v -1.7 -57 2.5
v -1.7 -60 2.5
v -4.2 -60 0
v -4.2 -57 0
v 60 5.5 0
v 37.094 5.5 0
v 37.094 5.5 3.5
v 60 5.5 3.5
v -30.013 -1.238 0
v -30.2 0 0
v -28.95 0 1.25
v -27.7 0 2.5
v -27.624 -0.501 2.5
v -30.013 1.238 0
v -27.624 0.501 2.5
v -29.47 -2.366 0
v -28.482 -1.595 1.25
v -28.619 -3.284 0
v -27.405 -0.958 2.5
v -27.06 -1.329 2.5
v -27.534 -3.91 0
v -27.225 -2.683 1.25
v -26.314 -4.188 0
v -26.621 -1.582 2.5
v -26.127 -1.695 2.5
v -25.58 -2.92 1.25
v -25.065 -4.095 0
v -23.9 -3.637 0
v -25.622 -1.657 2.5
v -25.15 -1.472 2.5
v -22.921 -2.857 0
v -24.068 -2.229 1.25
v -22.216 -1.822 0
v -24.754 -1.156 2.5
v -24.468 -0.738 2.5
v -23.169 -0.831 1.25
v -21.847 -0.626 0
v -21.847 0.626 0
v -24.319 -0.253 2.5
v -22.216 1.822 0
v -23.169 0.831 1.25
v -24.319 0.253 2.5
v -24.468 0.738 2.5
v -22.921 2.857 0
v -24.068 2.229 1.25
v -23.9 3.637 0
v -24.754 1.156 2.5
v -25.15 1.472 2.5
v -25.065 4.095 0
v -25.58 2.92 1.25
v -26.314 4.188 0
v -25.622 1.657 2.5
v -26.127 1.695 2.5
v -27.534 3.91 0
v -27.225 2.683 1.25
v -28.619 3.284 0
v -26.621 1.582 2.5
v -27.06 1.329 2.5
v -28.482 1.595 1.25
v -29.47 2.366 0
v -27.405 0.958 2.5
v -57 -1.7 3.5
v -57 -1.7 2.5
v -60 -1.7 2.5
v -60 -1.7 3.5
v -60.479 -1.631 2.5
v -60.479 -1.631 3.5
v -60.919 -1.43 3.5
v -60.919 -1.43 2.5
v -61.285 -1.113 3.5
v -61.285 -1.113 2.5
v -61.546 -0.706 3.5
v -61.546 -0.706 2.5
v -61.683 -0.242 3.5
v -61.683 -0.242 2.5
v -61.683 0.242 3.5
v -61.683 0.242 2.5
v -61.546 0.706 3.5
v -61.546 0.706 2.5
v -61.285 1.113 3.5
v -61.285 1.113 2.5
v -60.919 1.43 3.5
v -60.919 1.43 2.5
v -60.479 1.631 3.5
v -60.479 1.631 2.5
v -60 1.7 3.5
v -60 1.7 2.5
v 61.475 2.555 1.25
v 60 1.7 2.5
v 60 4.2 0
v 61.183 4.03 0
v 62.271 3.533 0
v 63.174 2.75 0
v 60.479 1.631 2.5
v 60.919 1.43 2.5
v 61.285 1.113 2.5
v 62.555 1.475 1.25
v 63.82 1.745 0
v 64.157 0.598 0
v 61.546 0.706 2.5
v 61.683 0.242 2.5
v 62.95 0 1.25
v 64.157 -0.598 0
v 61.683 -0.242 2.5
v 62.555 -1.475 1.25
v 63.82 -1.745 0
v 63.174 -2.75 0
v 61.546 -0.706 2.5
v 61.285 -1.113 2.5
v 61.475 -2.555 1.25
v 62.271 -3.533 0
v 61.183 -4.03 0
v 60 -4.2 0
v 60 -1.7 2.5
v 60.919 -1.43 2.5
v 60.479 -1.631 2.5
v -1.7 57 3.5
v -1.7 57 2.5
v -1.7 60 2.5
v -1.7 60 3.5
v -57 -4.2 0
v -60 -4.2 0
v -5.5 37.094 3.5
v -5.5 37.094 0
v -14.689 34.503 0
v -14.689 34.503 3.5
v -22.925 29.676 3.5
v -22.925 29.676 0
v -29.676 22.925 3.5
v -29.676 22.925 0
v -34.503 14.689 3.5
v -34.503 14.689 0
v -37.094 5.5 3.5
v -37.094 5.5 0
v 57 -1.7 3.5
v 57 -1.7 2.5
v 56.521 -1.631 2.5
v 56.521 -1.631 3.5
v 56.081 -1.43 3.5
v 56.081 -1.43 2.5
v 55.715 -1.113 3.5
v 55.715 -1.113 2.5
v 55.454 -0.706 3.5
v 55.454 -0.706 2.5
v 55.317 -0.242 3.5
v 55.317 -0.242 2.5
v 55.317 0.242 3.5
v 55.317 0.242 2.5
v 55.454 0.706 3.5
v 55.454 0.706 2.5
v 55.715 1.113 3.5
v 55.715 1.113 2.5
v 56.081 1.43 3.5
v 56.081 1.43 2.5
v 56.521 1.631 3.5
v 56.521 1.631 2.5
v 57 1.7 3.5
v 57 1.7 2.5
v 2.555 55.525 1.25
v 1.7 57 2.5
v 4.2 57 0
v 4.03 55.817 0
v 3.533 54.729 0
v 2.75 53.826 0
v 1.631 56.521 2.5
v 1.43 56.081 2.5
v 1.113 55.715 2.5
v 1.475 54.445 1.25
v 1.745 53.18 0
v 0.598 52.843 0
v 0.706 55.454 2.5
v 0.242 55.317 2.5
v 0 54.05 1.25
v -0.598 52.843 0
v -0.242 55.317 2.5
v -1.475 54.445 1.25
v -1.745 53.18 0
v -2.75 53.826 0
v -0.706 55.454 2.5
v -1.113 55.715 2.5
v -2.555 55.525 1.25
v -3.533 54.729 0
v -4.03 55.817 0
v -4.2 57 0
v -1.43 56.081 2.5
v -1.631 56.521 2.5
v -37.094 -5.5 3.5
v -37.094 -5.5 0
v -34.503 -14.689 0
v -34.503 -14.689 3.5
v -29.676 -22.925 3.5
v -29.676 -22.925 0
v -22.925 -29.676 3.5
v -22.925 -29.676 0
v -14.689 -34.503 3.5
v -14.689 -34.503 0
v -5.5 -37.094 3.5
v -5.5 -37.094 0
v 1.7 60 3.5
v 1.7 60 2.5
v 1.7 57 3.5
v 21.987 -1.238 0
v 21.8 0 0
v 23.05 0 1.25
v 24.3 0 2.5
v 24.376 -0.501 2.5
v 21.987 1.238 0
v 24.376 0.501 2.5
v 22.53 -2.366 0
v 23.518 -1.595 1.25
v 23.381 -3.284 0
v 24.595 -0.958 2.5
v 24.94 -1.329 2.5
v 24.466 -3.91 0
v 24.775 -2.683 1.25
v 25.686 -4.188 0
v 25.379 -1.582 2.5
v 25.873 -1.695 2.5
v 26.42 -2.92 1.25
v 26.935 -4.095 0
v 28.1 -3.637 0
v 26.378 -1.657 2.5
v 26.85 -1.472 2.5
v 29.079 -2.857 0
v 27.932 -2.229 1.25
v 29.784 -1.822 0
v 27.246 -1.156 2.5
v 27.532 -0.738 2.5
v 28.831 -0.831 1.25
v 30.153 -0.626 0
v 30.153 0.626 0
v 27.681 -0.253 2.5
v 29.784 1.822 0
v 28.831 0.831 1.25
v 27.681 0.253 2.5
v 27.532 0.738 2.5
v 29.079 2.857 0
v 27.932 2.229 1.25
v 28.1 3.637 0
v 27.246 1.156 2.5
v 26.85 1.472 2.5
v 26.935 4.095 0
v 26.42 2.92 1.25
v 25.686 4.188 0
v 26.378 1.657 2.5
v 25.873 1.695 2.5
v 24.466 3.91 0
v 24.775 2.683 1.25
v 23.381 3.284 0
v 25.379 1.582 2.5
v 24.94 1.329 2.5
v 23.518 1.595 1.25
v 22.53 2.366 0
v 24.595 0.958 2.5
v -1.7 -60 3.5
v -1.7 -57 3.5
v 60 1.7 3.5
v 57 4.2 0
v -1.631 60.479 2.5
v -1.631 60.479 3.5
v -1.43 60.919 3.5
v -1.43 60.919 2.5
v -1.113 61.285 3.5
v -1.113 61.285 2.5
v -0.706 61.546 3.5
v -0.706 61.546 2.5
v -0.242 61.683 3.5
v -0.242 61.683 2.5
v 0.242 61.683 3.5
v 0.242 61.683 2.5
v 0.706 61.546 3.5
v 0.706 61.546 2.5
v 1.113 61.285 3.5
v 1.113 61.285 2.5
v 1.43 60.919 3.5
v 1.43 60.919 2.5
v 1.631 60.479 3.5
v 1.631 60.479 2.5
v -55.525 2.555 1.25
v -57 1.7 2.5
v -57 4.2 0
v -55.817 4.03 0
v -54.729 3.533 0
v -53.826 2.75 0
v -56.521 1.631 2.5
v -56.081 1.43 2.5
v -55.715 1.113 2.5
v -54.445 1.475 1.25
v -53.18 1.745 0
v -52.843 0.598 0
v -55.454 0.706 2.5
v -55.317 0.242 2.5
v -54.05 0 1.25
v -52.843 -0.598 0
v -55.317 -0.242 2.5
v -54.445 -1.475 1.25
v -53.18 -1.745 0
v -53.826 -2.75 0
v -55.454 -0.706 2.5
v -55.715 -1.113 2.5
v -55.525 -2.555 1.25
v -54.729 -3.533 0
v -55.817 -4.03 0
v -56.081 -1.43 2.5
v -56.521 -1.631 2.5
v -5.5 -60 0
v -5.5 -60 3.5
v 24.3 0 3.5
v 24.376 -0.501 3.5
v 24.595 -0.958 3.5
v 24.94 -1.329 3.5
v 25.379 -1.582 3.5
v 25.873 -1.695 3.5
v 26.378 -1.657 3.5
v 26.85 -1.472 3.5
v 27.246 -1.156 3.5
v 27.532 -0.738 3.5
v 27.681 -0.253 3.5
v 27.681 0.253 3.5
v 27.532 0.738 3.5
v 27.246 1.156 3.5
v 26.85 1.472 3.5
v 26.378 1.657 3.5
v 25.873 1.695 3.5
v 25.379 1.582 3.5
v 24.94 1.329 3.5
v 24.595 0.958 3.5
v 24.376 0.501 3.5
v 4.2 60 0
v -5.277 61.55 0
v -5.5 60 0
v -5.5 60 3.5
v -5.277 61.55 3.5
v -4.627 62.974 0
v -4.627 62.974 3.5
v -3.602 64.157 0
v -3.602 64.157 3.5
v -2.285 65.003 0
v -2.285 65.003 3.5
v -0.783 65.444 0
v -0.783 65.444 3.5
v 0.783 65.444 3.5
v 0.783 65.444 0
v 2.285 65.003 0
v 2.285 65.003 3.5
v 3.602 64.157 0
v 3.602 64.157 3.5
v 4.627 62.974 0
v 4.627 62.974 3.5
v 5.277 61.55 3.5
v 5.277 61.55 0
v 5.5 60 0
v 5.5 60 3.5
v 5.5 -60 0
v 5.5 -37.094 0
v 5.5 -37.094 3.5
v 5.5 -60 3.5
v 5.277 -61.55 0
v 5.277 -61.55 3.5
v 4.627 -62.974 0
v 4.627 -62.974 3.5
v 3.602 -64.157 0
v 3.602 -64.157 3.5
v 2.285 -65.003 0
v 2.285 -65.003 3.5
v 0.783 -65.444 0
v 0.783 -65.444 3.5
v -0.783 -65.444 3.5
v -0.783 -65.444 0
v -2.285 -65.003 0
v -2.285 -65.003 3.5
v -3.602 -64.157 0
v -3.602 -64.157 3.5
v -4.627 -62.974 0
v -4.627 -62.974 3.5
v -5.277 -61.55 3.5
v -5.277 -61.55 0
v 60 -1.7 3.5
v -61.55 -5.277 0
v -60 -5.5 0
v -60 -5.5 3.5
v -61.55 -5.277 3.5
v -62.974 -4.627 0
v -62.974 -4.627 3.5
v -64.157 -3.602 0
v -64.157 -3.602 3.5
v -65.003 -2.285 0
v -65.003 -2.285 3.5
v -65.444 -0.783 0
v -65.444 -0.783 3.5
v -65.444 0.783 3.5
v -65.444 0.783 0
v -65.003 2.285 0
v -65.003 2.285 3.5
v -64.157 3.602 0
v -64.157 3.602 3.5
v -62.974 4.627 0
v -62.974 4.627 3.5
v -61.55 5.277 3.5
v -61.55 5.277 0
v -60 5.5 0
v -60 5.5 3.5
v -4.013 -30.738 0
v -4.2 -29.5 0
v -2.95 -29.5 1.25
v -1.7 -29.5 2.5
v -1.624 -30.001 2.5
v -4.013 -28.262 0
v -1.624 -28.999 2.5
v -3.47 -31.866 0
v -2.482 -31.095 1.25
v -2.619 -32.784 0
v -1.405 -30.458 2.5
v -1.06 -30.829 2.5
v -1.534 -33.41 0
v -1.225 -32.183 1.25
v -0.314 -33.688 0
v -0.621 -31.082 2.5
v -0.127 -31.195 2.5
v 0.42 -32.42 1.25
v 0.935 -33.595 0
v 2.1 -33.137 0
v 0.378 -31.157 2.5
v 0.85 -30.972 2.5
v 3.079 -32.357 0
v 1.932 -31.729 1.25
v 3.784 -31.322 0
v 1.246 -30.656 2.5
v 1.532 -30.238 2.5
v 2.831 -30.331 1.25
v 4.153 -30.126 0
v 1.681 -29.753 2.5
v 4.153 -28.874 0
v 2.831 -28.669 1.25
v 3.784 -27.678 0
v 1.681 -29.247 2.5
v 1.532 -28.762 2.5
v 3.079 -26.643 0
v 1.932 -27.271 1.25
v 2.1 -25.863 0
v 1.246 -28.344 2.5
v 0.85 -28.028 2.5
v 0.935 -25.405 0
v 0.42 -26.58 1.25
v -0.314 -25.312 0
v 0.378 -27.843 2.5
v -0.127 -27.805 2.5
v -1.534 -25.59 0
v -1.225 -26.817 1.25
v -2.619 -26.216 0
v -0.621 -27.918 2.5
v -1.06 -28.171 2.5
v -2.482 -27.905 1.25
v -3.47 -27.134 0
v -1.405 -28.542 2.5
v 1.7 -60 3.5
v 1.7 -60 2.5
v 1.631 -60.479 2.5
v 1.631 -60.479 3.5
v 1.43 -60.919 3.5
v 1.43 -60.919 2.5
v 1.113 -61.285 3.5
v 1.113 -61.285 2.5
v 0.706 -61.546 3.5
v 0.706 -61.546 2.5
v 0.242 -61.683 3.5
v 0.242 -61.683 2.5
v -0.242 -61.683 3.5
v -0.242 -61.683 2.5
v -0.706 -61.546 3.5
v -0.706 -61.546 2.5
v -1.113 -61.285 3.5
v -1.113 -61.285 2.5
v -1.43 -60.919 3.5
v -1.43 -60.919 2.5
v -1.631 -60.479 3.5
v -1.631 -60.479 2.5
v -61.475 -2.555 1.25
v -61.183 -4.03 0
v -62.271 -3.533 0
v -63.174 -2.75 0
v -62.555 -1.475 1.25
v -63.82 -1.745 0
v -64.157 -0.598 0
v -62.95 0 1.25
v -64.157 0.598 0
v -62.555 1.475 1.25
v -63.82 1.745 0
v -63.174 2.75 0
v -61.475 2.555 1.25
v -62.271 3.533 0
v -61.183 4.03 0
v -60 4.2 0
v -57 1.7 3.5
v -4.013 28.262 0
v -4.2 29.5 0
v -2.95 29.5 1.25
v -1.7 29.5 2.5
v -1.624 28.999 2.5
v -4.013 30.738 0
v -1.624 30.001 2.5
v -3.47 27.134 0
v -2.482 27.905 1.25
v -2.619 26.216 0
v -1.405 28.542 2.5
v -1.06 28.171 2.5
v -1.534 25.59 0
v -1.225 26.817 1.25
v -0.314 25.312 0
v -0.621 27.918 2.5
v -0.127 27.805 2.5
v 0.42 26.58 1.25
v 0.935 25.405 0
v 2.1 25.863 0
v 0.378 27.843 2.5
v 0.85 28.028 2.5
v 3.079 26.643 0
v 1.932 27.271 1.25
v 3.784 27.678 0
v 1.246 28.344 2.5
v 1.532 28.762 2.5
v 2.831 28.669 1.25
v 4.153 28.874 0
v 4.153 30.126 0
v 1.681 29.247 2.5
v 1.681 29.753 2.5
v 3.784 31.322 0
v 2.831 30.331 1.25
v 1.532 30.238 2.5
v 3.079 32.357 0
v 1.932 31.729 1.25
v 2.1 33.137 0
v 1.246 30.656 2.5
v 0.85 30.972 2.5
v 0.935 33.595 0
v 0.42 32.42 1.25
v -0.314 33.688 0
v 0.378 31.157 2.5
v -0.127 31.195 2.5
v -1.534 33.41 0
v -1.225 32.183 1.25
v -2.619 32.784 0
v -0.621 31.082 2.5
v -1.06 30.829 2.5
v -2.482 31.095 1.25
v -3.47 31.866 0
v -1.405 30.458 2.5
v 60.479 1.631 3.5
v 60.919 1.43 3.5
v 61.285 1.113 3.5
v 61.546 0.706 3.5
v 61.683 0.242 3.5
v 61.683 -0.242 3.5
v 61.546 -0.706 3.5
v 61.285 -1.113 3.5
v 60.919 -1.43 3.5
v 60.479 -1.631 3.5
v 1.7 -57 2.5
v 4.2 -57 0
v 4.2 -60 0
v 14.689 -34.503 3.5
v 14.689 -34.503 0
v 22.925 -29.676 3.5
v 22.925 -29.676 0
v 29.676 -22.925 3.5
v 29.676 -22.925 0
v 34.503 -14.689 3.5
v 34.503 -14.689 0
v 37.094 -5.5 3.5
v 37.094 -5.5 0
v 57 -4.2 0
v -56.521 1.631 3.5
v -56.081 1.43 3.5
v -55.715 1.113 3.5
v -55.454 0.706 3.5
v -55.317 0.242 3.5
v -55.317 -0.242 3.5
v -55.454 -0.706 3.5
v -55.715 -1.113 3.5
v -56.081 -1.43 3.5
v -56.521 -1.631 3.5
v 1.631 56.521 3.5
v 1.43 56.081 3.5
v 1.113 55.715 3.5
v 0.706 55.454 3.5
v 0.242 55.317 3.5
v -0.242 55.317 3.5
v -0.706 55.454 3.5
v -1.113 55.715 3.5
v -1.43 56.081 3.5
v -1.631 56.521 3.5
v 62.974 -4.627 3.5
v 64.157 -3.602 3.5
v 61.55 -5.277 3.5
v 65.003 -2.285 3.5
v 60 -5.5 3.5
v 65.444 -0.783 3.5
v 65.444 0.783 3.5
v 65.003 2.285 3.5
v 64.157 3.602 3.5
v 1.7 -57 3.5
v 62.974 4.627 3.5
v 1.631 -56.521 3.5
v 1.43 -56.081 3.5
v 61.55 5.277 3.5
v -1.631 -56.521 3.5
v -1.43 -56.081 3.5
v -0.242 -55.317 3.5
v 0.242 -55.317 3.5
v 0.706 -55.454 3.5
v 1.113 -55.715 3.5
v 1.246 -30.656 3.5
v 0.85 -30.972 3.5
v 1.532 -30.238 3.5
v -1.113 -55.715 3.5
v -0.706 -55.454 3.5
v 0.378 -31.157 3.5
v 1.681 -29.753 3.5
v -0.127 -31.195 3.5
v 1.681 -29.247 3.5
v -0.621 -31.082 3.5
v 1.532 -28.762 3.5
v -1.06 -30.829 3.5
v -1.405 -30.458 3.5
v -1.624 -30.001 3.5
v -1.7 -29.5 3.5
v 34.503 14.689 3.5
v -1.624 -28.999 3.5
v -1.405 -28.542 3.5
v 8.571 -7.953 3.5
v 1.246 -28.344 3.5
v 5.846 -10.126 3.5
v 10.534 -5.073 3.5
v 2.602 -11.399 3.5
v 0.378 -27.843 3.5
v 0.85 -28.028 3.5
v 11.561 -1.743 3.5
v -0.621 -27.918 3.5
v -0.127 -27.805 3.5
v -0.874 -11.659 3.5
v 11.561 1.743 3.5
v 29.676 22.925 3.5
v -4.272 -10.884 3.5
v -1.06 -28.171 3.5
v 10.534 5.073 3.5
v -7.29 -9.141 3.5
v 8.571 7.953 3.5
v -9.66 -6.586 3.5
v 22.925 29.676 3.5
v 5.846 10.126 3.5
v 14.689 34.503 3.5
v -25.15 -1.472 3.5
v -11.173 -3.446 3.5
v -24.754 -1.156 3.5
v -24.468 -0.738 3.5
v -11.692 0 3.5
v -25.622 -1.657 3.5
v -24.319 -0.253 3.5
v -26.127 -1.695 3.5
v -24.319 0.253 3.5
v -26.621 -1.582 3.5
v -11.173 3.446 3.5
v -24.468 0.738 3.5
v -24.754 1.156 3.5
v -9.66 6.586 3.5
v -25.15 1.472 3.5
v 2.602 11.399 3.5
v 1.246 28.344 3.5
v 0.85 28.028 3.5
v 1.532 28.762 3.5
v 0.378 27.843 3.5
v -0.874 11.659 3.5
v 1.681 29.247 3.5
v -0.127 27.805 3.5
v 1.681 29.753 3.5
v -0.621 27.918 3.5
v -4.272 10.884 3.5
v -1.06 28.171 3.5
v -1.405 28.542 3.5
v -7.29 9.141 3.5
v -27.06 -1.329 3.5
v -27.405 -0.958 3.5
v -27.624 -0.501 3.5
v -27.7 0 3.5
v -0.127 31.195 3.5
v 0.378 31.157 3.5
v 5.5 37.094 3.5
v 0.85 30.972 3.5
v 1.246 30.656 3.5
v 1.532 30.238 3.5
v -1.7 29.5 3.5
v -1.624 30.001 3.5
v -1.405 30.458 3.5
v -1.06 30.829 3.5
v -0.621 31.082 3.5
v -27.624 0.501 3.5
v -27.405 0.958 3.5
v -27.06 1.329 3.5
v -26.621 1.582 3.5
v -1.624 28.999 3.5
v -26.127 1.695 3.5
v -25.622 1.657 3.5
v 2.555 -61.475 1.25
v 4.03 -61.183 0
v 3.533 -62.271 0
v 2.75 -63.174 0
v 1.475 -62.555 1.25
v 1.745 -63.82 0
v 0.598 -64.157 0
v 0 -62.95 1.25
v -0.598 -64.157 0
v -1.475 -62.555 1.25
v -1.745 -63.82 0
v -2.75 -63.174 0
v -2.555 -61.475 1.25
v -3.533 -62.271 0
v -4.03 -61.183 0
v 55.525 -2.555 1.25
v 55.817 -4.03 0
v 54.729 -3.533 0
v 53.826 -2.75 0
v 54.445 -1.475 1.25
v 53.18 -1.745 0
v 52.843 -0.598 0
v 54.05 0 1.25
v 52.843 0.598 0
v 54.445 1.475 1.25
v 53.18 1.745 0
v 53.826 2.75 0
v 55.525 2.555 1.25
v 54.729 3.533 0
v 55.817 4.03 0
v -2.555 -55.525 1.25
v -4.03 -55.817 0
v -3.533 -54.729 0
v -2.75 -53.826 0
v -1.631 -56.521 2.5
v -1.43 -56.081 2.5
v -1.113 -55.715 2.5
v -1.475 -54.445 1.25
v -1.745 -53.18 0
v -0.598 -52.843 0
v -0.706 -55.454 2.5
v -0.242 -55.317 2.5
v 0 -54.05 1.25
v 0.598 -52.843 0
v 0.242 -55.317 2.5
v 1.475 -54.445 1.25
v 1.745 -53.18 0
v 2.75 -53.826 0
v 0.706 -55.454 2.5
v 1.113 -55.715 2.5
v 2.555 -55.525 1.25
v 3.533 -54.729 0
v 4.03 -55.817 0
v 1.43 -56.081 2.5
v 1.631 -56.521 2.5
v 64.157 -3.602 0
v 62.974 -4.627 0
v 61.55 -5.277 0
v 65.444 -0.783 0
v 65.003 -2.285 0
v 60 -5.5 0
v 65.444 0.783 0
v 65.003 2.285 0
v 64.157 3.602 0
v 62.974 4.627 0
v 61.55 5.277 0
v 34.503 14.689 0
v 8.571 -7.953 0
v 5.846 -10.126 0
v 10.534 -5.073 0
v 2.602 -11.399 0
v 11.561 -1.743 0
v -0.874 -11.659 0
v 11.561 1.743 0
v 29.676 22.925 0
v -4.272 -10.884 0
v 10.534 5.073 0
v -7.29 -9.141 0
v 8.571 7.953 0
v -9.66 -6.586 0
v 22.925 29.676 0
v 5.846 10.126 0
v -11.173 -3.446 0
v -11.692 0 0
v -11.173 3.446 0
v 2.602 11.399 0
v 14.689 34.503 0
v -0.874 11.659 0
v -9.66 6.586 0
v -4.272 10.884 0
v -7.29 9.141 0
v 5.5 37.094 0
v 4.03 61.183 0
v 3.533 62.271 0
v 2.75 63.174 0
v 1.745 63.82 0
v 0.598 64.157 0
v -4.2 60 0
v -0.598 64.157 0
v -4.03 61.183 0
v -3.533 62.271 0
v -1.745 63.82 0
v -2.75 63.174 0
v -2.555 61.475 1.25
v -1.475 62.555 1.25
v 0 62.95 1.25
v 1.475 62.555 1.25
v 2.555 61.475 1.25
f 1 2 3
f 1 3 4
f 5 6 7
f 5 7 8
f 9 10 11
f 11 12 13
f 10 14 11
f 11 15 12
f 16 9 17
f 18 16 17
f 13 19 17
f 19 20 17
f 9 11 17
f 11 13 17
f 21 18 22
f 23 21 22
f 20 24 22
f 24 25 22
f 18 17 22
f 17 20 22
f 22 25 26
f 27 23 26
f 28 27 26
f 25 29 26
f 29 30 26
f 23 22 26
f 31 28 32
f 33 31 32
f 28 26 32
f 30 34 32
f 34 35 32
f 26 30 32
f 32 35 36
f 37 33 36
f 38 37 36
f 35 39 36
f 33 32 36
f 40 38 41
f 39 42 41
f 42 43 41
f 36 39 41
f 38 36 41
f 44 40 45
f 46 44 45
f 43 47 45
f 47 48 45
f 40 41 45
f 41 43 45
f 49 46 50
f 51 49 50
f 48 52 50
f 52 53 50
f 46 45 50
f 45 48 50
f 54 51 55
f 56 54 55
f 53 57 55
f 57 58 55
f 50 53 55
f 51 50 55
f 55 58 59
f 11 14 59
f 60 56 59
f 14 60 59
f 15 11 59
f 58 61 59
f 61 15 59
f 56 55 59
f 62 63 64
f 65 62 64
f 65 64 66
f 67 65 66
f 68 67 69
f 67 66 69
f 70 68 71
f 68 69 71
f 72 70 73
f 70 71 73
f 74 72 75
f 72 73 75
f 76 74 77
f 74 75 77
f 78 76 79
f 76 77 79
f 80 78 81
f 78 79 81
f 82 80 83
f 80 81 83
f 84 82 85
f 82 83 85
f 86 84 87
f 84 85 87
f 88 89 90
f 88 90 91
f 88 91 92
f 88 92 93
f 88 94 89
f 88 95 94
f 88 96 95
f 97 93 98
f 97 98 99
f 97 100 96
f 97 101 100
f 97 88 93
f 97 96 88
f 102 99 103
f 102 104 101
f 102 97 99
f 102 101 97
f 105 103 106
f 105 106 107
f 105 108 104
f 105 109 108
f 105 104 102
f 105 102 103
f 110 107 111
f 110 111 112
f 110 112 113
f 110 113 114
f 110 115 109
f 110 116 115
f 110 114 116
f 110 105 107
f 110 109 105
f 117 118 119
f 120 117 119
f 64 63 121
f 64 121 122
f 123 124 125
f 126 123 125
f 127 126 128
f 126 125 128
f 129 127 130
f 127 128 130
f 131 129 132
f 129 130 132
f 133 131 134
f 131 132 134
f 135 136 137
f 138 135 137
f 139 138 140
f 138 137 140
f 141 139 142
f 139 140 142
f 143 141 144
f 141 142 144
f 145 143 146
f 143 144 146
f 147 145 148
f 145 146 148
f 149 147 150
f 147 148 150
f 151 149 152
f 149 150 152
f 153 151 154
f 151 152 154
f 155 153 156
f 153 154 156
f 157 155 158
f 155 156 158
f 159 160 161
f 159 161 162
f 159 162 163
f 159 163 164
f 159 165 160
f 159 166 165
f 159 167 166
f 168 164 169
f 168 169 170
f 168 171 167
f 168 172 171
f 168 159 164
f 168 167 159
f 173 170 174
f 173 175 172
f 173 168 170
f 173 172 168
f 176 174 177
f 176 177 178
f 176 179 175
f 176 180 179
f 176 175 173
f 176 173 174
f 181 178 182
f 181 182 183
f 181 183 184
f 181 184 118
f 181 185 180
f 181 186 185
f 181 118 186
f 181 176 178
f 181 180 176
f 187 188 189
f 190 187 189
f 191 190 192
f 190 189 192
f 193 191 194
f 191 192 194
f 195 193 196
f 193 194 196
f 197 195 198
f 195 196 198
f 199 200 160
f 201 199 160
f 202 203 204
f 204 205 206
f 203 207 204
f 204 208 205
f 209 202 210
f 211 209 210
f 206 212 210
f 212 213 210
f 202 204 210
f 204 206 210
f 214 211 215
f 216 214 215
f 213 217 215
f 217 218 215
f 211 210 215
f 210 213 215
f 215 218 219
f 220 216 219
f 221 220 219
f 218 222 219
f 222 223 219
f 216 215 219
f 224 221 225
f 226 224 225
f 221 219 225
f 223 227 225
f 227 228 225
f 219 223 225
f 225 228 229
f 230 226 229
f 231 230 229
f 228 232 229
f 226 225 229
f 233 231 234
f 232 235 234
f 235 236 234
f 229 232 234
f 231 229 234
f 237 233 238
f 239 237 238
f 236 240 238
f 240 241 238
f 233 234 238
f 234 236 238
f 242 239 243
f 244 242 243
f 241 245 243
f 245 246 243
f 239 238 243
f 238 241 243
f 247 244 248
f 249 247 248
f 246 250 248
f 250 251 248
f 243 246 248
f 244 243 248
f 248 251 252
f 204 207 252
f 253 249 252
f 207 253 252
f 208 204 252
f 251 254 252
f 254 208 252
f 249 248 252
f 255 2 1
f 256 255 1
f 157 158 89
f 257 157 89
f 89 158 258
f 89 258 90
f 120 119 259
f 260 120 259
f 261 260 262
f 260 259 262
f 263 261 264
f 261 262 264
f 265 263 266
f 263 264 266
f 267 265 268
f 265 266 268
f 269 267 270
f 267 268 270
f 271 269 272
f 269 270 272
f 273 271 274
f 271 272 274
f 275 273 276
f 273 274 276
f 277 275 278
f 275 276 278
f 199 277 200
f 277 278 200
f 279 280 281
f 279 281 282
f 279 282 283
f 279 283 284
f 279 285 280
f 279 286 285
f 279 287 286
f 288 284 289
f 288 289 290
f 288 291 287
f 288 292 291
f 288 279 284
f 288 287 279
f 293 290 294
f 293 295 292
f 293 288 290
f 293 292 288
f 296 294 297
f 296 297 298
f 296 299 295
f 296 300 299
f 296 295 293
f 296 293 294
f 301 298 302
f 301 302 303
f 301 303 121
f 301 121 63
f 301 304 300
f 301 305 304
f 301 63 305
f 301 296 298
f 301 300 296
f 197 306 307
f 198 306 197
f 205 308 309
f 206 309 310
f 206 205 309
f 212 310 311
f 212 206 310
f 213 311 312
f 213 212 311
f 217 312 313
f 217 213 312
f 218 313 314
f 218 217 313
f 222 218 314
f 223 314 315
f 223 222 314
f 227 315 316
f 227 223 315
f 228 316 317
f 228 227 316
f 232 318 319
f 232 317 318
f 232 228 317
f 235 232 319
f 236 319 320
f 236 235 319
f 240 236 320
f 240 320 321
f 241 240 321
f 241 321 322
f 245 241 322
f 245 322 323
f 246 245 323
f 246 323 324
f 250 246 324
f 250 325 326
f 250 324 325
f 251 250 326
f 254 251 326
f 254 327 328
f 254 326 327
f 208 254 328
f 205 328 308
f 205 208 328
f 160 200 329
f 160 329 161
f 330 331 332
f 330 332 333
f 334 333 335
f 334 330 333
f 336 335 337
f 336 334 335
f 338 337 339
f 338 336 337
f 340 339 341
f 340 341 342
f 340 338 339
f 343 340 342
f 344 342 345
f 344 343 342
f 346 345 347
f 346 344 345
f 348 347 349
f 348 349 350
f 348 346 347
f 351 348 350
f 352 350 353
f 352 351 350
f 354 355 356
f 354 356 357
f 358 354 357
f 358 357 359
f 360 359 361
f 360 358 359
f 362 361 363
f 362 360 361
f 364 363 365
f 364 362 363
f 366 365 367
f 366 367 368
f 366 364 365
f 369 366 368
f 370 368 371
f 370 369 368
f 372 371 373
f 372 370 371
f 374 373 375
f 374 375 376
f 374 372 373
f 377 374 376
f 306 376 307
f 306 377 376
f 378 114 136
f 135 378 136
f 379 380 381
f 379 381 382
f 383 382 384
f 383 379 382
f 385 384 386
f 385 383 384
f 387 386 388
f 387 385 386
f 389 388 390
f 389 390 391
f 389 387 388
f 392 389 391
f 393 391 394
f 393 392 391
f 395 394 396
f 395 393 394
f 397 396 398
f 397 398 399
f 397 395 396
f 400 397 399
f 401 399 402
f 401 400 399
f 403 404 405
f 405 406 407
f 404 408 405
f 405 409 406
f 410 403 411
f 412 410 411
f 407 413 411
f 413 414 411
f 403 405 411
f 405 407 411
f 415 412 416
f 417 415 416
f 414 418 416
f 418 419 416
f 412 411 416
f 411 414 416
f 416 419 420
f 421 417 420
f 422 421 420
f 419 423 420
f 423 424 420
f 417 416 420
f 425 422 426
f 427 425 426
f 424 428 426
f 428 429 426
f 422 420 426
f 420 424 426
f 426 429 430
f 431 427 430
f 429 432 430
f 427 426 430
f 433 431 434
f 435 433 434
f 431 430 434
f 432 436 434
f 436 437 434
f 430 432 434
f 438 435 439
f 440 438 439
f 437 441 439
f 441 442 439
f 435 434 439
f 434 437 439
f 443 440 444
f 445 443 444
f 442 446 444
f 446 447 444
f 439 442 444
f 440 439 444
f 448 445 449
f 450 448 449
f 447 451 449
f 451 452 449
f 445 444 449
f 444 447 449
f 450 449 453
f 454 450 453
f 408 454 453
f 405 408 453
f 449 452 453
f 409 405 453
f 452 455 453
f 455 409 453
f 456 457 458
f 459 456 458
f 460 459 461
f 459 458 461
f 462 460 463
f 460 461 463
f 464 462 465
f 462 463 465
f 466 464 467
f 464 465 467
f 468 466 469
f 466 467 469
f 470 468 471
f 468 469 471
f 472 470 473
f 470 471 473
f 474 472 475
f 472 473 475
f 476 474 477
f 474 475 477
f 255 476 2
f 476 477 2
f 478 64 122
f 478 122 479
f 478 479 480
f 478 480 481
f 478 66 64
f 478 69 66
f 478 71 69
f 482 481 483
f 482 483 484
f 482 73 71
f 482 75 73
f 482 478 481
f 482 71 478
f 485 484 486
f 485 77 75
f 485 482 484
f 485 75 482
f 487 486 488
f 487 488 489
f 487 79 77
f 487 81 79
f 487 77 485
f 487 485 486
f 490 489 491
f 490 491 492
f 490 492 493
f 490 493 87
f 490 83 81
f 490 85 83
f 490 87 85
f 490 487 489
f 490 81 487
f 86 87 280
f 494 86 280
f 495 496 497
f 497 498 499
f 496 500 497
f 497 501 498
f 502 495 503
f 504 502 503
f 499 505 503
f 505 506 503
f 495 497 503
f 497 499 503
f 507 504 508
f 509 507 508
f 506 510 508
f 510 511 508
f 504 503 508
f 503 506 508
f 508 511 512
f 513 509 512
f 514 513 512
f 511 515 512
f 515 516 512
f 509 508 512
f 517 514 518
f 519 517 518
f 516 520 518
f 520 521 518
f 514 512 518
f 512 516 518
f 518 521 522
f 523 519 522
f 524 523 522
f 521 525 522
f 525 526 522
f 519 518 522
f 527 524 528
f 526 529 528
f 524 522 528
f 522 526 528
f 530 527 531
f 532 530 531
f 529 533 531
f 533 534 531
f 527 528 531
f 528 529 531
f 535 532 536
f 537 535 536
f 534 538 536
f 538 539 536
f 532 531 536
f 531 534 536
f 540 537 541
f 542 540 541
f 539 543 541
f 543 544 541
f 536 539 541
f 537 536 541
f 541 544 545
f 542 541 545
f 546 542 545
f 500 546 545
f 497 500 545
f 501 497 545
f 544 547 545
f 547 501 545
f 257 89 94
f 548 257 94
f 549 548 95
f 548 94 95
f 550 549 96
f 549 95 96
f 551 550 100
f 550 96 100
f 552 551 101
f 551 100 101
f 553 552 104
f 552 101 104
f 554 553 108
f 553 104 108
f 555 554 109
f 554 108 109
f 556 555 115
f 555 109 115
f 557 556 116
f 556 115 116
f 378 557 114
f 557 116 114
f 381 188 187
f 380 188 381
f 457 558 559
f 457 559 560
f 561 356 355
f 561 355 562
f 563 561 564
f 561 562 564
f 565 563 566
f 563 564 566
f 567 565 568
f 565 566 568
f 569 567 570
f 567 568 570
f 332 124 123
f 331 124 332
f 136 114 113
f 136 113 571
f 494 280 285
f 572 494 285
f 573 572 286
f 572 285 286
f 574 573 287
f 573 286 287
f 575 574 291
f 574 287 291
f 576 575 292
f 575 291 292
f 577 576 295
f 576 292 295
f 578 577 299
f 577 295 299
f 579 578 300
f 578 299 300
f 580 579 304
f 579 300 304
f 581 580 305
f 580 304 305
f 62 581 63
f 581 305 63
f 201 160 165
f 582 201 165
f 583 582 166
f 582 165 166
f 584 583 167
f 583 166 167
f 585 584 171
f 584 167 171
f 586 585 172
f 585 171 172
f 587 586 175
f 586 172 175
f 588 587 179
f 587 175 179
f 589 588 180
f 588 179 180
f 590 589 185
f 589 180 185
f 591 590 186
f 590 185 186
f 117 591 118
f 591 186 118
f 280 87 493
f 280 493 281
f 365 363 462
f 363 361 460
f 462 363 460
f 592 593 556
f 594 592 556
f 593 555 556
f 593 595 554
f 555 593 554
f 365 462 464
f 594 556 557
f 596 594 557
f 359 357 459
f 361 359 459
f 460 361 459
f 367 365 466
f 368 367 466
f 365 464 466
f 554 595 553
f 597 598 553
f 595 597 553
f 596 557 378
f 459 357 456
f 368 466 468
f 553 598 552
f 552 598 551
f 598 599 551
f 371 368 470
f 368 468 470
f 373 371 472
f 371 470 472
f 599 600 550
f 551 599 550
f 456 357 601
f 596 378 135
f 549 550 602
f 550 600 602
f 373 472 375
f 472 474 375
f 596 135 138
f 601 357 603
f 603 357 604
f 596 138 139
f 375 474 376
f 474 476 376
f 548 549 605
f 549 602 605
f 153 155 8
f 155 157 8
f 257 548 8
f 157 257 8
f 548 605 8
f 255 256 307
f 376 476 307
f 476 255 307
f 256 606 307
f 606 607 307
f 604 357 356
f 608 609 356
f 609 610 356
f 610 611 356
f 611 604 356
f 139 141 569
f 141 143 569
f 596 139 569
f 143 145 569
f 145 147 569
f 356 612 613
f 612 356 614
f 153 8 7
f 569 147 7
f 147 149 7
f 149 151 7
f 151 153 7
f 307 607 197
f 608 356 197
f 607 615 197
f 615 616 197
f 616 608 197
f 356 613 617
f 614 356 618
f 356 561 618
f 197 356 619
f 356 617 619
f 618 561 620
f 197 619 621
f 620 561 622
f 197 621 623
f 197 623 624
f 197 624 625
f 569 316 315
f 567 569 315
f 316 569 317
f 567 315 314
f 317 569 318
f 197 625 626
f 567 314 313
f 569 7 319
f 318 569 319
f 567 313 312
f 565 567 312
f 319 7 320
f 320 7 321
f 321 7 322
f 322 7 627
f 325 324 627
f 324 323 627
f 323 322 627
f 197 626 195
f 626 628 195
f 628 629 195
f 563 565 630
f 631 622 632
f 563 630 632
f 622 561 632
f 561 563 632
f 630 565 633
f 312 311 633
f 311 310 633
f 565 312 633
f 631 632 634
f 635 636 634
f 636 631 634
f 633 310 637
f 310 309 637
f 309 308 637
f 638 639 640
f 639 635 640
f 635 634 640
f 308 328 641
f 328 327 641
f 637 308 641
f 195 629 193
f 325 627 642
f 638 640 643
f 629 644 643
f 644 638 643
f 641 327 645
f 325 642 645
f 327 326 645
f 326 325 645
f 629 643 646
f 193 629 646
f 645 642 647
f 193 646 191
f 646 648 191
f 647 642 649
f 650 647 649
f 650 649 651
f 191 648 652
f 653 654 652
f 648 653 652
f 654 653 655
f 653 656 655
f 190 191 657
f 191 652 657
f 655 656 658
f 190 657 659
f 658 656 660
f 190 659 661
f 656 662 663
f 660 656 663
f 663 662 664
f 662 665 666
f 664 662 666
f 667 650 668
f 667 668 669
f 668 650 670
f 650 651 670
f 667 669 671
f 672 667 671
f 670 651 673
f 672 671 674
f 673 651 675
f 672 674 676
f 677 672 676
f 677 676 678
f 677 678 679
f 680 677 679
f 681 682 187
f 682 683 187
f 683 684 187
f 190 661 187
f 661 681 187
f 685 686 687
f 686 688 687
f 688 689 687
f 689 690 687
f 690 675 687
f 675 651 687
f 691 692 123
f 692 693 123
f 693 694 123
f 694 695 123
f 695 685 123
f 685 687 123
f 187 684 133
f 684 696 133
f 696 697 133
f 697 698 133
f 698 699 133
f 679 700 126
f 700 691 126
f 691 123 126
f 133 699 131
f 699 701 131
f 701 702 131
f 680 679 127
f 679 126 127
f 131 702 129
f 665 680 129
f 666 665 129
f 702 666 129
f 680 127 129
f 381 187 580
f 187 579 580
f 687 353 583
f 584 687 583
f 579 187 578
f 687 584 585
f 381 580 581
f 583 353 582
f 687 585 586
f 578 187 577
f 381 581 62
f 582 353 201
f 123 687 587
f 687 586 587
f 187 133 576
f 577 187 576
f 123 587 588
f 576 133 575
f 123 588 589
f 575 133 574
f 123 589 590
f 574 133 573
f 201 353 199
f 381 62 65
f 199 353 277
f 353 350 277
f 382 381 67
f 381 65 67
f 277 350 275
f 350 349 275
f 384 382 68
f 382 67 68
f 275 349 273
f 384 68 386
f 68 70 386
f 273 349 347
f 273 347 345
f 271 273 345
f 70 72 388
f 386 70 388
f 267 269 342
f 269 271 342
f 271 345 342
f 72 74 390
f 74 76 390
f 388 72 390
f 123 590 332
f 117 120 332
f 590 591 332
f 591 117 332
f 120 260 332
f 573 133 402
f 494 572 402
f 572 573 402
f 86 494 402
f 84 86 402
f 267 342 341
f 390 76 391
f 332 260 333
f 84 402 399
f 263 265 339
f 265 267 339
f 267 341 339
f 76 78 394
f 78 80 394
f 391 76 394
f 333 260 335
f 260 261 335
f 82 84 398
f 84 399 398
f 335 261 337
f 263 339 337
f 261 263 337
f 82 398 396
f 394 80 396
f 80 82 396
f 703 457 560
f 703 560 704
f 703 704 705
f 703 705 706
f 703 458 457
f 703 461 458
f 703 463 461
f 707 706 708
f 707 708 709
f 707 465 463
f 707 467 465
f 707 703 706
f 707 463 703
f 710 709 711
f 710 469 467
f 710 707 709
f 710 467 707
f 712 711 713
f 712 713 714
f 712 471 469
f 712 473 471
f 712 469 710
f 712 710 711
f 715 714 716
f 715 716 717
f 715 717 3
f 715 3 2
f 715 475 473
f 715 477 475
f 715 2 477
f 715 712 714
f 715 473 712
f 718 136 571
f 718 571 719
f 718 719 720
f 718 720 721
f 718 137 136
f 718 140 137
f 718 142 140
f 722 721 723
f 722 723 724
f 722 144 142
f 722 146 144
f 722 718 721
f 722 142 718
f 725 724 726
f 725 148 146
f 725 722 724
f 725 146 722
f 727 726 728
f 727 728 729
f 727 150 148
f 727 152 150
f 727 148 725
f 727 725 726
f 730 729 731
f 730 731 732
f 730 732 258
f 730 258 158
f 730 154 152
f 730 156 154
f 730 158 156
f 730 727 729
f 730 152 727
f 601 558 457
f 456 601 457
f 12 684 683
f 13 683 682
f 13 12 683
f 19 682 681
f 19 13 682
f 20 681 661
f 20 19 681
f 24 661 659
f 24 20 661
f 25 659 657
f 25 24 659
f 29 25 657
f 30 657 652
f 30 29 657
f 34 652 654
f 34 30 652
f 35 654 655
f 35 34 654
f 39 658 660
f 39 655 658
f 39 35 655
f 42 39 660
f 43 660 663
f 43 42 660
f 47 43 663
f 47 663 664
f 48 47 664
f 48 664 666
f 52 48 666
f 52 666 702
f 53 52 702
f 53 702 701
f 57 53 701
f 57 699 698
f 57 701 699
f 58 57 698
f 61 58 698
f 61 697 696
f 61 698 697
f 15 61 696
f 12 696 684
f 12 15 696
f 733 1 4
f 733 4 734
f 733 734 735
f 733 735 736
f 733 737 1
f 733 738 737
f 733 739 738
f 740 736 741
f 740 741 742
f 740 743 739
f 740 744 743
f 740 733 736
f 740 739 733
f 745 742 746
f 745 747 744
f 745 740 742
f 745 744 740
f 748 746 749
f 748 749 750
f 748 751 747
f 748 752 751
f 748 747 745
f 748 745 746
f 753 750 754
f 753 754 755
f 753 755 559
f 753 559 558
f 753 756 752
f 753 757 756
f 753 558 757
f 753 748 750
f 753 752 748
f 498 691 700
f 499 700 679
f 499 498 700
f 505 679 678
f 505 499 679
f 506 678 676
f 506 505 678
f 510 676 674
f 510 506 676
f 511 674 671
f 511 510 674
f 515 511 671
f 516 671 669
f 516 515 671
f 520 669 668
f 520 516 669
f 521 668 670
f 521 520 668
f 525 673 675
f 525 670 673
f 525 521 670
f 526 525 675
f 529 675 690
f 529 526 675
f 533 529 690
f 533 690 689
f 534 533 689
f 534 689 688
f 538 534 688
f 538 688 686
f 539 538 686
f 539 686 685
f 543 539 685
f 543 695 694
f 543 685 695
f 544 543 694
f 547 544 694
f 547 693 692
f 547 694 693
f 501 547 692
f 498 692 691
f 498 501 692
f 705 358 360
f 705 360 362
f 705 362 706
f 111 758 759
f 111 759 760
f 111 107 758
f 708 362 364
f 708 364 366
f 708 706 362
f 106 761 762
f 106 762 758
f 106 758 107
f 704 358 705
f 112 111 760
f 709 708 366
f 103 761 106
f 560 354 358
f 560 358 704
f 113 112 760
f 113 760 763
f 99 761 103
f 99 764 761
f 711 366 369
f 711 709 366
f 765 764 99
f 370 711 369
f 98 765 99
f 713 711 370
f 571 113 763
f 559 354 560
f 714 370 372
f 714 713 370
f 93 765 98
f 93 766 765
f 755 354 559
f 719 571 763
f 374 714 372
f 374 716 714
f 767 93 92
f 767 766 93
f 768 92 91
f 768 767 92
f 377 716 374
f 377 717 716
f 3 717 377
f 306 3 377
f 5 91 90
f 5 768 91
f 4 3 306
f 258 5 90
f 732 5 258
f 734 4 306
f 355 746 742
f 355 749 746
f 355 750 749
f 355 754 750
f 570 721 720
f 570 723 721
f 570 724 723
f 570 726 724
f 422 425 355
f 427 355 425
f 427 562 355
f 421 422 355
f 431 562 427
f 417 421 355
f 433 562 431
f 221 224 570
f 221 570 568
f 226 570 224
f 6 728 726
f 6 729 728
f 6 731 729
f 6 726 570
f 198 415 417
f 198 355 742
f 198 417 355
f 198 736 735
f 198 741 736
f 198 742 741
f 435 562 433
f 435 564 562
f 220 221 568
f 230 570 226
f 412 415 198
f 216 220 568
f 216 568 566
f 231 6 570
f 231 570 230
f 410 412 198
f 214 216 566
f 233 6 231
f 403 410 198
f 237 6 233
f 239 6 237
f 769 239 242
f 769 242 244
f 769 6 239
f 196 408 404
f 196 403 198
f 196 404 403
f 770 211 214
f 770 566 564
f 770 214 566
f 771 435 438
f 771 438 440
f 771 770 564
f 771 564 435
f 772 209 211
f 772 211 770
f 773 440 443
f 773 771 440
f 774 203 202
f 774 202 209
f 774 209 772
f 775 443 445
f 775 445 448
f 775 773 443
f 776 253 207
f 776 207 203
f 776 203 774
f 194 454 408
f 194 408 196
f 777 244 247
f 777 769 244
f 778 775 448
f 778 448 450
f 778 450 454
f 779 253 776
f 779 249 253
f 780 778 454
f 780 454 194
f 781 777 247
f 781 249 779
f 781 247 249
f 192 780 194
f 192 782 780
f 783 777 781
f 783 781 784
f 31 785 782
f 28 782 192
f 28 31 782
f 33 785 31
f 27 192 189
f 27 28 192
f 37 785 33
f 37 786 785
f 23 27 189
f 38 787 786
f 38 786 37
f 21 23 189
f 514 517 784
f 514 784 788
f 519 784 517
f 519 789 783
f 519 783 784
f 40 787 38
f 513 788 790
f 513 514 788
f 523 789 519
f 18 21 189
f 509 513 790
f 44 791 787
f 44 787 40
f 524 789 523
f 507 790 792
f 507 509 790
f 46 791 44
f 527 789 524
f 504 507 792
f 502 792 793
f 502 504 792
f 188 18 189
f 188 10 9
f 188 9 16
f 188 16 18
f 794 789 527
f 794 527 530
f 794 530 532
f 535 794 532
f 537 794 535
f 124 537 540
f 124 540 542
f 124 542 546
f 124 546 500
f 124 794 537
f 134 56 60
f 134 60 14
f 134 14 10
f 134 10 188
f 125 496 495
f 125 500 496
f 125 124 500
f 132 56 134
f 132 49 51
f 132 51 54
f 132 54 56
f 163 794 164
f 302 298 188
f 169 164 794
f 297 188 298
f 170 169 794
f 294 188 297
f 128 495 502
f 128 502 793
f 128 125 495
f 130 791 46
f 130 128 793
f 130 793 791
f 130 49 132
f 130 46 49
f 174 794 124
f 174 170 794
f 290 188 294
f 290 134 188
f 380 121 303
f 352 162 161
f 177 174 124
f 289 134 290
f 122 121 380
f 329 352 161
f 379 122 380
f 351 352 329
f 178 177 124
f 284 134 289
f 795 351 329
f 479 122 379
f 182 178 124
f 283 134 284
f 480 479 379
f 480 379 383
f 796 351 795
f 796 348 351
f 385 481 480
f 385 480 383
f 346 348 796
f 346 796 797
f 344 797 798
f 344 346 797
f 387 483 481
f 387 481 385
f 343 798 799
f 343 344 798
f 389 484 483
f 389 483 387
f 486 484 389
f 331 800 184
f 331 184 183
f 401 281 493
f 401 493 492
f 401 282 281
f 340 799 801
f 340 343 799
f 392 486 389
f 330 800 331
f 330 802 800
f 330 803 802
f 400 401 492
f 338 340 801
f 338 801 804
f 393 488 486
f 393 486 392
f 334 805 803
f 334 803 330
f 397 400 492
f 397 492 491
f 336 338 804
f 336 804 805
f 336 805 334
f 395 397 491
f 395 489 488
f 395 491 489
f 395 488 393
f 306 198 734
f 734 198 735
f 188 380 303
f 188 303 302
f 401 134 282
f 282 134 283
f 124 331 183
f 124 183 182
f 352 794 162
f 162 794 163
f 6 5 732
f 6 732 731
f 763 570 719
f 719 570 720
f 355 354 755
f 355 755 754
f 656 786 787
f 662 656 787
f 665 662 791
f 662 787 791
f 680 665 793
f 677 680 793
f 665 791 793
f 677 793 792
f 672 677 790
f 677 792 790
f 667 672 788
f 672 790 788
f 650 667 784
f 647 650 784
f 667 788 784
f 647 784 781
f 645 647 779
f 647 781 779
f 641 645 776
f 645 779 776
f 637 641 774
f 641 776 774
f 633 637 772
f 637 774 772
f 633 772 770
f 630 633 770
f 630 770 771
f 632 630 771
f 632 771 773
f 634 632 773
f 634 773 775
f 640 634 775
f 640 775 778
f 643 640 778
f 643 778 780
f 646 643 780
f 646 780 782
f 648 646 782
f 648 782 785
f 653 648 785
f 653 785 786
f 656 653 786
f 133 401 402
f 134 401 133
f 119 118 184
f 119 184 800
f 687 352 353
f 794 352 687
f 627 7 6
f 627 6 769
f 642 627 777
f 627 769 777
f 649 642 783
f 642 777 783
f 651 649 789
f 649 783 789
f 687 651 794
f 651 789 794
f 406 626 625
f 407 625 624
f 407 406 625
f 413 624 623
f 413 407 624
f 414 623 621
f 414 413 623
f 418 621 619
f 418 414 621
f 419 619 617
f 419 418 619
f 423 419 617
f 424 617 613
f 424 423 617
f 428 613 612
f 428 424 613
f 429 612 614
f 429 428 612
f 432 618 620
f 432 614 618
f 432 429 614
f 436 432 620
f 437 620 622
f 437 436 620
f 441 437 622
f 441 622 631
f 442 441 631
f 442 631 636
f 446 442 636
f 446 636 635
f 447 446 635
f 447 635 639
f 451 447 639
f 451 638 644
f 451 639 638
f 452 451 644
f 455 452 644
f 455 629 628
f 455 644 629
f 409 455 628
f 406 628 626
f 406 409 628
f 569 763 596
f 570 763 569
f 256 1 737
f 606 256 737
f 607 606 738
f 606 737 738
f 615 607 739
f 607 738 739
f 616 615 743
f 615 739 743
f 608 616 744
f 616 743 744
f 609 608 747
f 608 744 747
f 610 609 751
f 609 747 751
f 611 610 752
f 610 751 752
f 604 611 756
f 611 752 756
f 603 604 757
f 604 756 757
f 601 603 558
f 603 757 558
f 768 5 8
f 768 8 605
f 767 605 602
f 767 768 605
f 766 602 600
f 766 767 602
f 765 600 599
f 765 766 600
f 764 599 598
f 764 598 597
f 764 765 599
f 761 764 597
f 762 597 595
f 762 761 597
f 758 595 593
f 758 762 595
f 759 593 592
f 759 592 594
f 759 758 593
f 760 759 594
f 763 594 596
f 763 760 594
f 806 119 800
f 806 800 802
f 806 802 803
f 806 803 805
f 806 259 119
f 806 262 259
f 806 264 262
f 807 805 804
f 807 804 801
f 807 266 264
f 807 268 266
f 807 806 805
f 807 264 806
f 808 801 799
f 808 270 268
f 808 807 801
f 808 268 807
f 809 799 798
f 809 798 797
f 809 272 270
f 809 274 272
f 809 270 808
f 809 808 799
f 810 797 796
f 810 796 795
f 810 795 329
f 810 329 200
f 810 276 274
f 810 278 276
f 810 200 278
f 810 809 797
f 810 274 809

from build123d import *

# Parameters (mm, degrees)
BOSS_EXTRUDE1_DEPTH = 3.5
SKETCH1_3_R         = 1.7
CUT_EXTRUDE1_DEPTH  = 13
CHAMFER1_SIZE       = 2.5
SKETCH2_R           = 11.692051929
CUT_EXTRUDE2_DEPTH  = 10


with BuildPart() as part:
    # Sketch1 → Boss-Extrude1 (new body)
    with BuildSketch(Plane.XY):
        with BuildLine():
            Line((37.094473982, -5.5), (60, -5.5))
            ThreePointArc((60, -5.5), (65.5, 0), (60, 5.5))
            Line((60, 5.5), (37.094473982, 5.5))
            ThreePointArc((37.094473982, 5.5), (26.516504294, 26.516504294), (5.5, 37.094473982))
            Line((5.5, 37.094473982), (5.5, 60))
            ThreePointArc((5.5, 60), (0, 65.5), (-5.5, 60))
            Line((-5.5, 60), (-5.5, 37.094473982))
            ThreePointArc((-5.5, 37.094473982), (-26.516504294, 26.516504294), (-37.094473982, 5.5))
            Line((-37.094473982, 5.5), (-60, 5.5))
            ThreePointArc((-60, 5.5), (-65.5, 0), (-60, -5.5))
            Line((-60, -5.5), (-37.094473982, -5.5))
            ThreePointArc((-37.094473982, -5.5), (-26.516504294, -26.516504294), (-5.5, -37.094473982))
            Line((-5.5, -37.094473982), (-5.5, -60))
            ThreePointArc((-5.5, -60), (0, -65.5), (5.5, -60))
            Line((5.5, -60), (5.5, -37.094473982))
            ThreePointArc((5.5, -37.094473982), (26.516504294, -26.516504294), (37.094473982, -5.5))
        make_face()
        with BuildLine():
            ThreePointArc((60, 1.7), (61.7, 0), (60, -1.7))
            Line((60, -1.7), (57, -1.7))
            ThreePointArc((57, -1.7), (55.3, 0), (57, 1.7))
            Line((57, 1.7), (60, 1.7))
        make_face(mode=Mode.SUBTRACT)
        with BuildLine():
            Line((-1.7, -60), (-1.7, -57))
            ThreePointArc((-1.7, -57), (0, -55.3), (1.7, -57))
            Line((1.7, -57), (1.7, -60))
            ThreePointArc((1.7, -60), (0, -61.7), (-1.7, -60))
        make_face(mode=Mode.SUBTRACT)
        with BuildLine():
            Line((-60, 1.7), (-57, 1.7))
            ThreePointArc((-57, 1.7), (-55.3, 0), (-57, -1.7))
            Line((-57, -1.7), (-60, -1.7))
            ThreePointArc((-60, -1.7), (-61.7, 0), (-60, 1.7))
        make_face(mode=Mode.SUBTRACT)
        with BuildLine():
            Line((1.7, 60), (1.7, 57))
            ThreePointArc((1.7, 57), (0, 55.3), (-1.7, 57))
            Line((-1.7, 57), (-1.7, 60))
            ThreePointArc((-1.7, 60), (0, 61.7), (1.7, 60))
        make_face(mode=Mode.SUBTRACT)
    extrude(amount=BOSS_EXTRUDE1_DEPTH)

    # Sketch1<3> → Cut-Extrude1 (cut)
    with BuildSketch(Plane.XY):
        with Locations((0, 29.5)):
            Circle(SKETCH1_3_R)
        with Locations((26, 0)):
            Circle(SKETCH1_3_R)
        with Locations((-26, 0)):
            Circle(SKETCH1_3_R)
        with Locations((0, -29.5)):
            Circle(SKETCH1_3_R)
    extrude(amount=CUT_EXTRUDE1_DEPTH, mode=Mode.SUBTRACT)

    # Chamfer1
    chamfer1_edges = [part.edges().sort_by_distance(p)[0] for p in [
        (0, 55.3, 0),
        (1.7, 58.5, 0),
        (-1.7, 58.5, 0),
        (0, 61.7, 0),
        (-58.5, -1.7, 0),
        (-61.7, 0, 0),
        (-55.3, 0, 0),
        (-58.5, 1.7, 0),
        (0, -61.7, 0),
        (1.7, -58.5, 0),
        (-1.7, -58.5, 0),
        (0, -55.3, 0),
        (58.5, -1.7, 0),
        (61.7, 0, 0),
        (55.3, 0, 0),
        (58.5, 1.7, 0),
        (24.3, 0, 0),
        (-1.7, 29.5, 0),
        (-1.7, -29.5, 0),
        (-27.7, 0, 0),
    ]]
    chamfer(chamfer1_edges, length=CHAMFER1_SIZE)

    # Sketch2 → Cut-Extrude2 (cut)
    with BuildSketch(Plane(origin=(0, 0, 0), x_dir=(-1, 0, 0), z_dir=(0, 0, -1))):
        Circle(SKETCH2_R)
    extrude(amount=-CUT_EXTRUDE2_DEPTH, mode=Mode.SUBTRACT)


solid = part.part
